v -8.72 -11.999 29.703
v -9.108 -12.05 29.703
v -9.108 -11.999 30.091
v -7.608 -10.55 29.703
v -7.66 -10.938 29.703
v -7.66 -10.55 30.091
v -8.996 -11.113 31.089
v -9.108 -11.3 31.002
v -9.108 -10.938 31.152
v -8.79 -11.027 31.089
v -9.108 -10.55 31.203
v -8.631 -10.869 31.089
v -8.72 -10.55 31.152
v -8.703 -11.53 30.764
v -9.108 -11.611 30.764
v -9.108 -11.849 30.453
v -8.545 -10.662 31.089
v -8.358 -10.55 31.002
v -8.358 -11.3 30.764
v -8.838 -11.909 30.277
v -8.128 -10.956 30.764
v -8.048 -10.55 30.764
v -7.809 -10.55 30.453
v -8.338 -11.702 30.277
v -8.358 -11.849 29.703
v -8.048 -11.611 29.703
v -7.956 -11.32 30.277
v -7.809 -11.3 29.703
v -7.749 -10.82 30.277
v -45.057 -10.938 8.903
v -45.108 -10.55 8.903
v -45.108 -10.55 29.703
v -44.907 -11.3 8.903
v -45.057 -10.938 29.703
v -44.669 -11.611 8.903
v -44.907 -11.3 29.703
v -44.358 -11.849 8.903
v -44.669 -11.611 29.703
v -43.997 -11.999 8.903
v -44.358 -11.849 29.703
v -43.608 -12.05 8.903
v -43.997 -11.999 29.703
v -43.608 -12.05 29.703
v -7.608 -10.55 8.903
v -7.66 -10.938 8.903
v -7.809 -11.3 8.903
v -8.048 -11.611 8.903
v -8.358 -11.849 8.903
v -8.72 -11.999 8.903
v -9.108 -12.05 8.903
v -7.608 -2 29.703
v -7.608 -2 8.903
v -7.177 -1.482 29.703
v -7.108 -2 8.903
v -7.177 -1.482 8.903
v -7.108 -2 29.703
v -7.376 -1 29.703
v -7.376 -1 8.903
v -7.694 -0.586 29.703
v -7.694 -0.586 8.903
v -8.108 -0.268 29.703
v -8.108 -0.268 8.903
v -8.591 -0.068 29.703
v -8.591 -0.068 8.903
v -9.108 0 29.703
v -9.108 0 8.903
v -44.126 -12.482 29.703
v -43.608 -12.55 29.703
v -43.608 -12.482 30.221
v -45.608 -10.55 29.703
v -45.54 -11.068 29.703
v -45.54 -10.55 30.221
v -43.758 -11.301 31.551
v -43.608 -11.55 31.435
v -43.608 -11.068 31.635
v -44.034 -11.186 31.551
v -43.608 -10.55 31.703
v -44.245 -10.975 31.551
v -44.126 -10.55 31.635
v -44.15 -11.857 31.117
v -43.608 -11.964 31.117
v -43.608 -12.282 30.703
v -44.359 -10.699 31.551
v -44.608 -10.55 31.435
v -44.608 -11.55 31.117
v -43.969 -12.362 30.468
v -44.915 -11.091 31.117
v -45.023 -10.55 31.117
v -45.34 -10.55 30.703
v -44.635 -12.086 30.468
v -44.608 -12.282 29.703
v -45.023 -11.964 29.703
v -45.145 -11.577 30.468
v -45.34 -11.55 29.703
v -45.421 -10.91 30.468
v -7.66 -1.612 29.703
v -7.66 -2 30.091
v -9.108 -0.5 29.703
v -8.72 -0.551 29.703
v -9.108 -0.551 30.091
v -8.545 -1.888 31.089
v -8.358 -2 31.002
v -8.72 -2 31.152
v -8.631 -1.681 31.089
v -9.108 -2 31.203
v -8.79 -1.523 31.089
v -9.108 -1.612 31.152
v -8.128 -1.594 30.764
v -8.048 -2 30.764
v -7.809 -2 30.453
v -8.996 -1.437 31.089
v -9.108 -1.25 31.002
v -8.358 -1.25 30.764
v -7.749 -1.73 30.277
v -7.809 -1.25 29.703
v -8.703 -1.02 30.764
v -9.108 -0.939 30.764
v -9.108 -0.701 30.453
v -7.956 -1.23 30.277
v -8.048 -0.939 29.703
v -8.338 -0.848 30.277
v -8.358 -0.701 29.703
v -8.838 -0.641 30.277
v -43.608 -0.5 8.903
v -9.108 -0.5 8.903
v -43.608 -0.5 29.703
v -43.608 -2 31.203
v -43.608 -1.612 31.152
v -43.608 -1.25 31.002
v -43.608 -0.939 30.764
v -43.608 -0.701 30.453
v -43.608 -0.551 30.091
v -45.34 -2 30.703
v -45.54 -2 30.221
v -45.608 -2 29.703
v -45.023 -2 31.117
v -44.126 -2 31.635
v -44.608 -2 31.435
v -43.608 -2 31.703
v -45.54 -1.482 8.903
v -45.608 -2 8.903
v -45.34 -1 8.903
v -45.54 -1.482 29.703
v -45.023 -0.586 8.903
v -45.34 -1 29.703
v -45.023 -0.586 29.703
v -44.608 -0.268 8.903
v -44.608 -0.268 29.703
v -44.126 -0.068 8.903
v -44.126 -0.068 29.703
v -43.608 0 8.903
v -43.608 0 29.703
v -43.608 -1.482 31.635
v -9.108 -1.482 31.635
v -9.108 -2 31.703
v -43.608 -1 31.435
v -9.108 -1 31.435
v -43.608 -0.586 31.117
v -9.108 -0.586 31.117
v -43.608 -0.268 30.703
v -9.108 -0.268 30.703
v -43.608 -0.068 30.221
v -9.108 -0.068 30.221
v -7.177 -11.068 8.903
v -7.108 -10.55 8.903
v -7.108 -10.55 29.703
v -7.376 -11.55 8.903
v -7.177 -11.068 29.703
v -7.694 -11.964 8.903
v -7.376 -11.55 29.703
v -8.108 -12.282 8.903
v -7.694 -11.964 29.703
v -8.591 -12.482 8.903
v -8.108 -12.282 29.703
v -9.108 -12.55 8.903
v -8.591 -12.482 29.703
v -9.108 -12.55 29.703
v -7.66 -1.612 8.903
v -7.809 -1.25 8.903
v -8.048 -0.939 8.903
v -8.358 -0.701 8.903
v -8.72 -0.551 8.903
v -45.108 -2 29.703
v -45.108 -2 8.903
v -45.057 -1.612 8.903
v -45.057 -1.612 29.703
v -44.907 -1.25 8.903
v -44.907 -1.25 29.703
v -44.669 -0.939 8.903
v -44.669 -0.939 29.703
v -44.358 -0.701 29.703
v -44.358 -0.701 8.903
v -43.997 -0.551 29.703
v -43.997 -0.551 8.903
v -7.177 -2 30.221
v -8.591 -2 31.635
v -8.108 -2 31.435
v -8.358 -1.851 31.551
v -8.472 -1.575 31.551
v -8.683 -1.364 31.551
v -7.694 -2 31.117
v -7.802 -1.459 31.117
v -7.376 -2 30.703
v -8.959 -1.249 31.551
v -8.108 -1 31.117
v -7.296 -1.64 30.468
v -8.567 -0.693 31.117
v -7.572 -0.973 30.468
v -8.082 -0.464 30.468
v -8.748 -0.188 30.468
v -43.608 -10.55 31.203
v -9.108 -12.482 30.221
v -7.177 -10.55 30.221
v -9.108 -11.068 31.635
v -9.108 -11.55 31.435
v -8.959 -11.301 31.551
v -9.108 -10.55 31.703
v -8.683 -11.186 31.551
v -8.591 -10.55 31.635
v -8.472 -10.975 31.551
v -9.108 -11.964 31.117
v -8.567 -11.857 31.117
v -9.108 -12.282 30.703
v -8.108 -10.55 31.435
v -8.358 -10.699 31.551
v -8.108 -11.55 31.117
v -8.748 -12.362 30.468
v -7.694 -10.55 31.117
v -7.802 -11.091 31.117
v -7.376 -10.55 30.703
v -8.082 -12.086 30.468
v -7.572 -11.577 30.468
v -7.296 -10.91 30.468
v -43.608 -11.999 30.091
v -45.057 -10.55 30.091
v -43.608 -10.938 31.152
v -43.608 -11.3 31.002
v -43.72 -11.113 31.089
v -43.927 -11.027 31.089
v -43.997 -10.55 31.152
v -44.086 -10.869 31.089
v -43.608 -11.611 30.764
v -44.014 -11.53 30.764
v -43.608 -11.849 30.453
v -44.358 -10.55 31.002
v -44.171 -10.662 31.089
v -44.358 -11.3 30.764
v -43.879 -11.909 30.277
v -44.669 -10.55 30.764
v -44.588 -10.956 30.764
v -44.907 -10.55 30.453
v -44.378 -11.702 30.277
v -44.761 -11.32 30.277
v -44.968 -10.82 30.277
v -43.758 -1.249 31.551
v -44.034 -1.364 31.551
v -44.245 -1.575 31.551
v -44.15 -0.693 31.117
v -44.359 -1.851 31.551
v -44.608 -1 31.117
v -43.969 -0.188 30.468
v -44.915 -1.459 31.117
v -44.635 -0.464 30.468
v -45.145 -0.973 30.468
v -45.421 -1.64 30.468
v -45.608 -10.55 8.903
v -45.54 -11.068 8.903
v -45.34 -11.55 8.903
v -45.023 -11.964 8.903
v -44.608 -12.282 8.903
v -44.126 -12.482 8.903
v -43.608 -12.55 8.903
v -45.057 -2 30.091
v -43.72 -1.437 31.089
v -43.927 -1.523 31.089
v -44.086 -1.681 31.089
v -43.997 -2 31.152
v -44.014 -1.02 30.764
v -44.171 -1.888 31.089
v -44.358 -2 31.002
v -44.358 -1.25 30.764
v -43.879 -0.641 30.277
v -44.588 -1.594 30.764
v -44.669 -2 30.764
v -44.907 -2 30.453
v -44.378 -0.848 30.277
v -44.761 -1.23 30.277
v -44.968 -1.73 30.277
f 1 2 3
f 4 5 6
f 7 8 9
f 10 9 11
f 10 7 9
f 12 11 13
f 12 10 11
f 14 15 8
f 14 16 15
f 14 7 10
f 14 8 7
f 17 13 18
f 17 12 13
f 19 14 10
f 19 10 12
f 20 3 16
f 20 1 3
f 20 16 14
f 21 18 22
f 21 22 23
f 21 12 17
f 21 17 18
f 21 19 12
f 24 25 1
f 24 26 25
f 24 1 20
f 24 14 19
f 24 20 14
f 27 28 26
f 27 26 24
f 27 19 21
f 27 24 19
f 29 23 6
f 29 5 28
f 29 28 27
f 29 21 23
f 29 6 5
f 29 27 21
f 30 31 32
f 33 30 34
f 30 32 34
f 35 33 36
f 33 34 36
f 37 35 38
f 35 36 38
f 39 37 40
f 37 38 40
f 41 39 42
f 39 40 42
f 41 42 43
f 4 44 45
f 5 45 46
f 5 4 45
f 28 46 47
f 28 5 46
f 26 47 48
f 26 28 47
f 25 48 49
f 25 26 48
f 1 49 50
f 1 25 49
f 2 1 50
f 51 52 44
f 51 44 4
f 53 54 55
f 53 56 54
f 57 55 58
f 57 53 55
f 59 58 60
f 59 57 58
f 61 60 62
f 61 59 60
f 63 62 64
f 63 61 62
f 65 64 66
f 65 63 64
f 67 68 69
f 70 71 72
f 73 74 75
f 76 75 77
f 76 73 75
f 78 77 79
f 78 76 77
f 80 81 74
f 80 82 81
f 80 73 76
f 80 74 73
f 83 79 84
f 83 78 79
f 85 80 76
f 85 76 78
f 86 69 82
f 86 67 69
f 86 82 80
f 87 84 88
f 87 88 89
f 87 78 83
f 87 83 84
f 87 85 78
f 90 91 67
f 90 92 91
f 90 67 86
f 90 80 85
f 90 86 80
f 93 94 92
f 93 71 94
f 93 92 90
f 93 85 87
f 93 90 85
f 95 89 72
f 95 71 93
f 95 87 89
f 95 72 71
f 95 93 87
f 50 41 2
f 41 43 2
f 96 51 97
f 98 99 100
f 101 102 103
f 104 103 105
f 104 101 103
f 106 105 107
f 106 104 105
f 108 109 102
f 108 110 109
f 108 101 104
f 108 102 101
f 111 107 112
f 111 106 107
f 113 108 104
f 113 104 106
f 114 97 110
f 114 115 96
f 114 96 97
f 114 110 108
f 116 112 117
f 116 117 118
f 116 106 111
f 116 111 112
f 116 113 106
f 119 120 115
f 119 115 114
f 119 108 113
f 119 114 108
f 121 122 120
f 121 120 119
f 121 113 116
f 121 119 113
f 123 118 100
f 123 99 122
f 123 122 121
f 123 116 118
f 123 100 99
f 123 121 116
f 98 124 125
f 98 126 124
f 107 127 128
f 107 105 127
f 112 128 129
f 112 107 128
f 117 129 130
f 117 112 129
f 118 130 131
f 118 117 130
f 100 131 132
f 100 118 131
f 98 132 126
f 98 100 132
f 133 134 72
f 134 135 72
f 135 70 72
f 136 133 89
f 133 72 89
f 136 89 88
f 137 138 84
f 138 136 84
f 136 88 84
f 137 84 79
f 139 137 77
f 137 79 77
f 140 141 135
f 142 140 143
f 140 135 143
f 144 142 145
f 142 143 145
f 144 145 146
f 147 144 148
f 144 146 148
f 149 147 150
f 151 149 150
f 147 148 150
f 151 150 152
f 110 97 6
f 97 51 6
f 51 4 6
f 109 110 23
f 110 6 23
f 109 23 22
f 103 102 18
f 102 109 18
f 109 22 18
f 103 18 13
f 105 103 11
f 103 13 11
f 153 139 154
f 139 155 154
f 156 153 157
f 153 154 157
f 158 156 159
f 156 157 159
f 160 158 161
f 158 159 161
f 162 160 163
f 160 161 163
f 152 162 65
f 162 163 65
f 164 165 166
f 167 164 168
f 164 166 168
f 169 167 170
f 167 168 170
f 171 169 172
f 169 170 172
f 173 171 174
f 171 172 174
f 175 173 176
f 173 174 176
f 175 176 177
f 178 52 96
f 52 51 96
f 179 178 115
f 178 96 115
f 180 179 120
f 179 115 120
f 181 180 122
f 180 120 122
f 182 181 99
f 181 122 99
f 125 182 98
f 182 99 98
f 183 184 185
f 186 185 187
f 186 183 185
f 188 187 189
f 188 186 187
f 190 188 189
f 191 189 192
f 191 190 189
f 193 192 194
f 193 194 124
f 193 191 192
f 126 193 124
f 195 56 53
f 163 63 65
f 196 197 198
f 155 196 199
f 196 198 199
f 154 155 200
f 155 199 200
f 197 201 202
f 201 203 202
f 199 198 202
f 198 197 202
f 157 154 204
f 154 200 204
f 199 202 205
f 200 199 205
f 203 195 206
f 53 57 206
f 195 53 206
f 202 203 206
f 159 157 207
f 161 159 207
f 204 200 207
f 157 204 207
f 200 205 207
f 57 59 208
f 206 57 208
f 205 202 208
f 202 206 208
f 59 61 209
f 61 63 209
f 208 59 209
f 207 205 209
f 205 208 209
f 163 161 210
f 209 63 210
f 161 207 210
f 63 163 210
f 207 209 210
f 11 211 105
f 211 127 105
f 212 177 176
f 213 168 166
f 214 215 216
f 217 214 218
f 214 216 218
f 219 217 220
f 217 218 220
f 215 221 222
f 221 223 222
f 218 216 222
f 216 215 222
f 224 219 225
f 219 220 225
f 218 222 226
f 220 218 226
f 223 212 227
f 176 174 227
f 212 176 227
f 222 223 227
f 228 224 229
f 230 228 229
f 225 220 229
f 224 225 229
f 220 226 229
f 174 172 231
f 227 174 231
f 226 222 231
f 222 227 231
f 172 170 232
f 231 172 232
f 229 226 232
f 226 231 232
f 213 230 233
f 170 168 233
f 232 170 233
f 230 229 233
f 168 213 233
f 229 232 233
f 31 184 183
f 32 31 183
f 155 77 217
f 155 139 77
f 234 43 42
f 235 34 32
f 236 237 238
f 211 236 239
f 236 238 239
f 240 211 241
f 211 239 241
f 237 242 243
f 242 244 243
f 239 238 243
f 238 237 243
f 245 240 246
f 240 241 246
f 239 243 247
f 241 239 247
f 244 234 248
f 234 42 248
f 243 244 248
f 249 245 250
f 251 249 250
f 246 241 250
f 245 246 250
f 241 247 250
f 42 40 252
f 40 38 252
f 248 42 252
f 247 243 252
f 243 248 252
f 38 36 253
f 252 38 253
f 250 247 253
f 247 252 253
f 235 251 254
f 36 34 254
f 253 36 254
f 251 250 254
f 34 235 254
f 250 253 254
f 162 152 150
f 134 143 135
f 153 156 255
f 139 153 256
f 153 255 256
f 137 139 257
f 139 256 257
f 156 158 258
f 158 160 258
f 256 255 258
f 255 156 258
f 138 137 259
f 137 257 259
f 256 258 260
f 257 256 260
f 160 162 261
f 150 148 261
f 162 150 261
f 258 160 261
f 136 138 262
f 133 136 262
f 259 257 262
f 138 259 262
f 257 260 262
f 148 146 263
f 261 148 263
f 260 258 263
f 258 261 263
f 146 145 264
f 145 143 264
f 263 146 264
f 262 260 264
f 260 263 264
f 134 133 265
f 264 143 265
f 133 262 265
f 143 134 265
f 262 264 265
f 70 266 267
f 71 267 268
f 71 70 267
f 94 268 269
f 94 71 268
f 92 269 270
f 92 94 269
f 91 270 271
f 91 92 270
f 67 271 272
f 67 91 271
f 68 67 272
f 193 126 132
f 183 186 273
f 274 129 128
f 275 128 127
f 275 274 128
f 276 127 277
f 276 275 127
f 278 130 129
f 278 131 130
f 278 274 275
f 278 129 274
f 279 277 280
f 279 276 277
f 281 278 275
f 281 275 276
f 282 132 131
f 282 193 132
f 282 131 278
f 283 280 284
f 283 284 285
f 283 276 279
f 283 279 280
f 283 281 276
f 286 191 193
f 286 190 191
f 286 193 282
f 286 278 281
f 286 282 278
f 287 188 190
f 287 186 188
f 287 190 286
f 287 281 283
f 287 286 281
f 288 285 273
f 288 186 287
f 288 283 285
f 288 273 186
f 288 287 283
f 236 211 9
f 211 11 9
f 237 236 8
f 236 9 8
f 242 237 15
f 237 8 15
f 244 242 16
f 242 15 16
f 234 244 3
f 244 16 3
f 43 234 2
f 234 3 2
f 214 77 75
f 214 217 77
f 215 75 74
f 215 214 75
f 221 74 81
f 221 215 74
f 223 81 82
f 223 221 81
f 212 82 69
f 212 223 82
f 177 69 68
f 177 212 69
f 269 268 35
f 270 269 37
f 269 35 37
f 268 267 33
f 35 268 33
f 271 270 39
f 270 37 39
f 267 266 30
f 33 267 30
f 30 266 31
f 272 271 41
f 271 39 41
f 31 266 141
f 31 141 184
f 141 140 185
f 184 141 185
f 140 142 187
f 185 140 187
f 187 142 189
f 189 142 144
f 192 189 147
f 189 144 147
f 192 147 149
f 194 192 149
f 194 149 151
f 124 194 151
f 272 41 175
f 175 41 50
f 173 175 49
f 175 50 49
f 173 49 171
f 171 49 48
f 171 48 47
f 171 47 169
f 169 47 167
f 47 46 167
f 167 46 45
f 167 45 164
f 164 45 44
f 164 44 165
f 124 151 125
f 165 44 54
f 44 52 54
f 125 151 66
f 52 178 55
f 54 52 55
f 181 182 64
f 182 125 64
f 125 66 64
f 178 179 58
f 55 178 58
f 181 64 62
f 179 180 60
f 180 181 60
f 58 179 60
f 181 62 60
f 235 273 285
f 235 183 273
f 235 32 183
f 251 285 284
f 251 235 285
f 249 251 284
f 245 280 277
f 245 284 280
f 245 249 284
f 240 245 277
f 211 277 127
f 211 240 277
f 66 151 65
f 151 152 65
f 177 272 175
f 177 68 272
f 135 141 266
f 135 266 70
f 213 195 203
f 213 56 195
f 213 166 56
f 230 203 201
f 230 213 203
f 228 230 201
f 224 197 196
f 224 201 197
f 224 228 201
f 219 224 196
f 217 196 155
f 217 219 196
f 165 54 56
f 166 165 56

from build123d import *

# Parameters (mm, degrees)
F0_W     = 38.5
F0_H     = 22.8
F1_DEPTH = 12.55
F2_R     = 2
F3_T     = -0.5


with BuildPart() as f1:
    # F0 (on Front) → F1 (new body)
    with BuildSketch(Plane.XZ):
        with Locations((-26.358417, 20.3031)):
            Rectangle(F0_W, F0_H)
    extrude(amount=F1_DEPTH)

    # F2
    f2_edges = [f1.edges().sort_by_distance(p)[0] for p in [
        (-45.608417, -12.55, 20.3031),
        (-45.608417, 0, 20.3031),
        (-7.108417, -12.55, 20.3031),
        (-7.108417, 0, 20.3031),
        (-26.358417, -12.55, 31.7031),
        (-7.108417, -6.275, 31.7031),
        (-26.358417, 0, 31.7031),
        (-45.608417, -6.275, 31.7031),
    ]]
    fillet(f2_edges, radius=F2_R)

    # F3
    f3_openings = [f1.faces().sort_by_distance(p)[0] for p in [
        (-26.358417, -6.275, 8.9031),
    ]]
    offset(amount=F3_T, openings=f3_openings)


solid = f1.part
